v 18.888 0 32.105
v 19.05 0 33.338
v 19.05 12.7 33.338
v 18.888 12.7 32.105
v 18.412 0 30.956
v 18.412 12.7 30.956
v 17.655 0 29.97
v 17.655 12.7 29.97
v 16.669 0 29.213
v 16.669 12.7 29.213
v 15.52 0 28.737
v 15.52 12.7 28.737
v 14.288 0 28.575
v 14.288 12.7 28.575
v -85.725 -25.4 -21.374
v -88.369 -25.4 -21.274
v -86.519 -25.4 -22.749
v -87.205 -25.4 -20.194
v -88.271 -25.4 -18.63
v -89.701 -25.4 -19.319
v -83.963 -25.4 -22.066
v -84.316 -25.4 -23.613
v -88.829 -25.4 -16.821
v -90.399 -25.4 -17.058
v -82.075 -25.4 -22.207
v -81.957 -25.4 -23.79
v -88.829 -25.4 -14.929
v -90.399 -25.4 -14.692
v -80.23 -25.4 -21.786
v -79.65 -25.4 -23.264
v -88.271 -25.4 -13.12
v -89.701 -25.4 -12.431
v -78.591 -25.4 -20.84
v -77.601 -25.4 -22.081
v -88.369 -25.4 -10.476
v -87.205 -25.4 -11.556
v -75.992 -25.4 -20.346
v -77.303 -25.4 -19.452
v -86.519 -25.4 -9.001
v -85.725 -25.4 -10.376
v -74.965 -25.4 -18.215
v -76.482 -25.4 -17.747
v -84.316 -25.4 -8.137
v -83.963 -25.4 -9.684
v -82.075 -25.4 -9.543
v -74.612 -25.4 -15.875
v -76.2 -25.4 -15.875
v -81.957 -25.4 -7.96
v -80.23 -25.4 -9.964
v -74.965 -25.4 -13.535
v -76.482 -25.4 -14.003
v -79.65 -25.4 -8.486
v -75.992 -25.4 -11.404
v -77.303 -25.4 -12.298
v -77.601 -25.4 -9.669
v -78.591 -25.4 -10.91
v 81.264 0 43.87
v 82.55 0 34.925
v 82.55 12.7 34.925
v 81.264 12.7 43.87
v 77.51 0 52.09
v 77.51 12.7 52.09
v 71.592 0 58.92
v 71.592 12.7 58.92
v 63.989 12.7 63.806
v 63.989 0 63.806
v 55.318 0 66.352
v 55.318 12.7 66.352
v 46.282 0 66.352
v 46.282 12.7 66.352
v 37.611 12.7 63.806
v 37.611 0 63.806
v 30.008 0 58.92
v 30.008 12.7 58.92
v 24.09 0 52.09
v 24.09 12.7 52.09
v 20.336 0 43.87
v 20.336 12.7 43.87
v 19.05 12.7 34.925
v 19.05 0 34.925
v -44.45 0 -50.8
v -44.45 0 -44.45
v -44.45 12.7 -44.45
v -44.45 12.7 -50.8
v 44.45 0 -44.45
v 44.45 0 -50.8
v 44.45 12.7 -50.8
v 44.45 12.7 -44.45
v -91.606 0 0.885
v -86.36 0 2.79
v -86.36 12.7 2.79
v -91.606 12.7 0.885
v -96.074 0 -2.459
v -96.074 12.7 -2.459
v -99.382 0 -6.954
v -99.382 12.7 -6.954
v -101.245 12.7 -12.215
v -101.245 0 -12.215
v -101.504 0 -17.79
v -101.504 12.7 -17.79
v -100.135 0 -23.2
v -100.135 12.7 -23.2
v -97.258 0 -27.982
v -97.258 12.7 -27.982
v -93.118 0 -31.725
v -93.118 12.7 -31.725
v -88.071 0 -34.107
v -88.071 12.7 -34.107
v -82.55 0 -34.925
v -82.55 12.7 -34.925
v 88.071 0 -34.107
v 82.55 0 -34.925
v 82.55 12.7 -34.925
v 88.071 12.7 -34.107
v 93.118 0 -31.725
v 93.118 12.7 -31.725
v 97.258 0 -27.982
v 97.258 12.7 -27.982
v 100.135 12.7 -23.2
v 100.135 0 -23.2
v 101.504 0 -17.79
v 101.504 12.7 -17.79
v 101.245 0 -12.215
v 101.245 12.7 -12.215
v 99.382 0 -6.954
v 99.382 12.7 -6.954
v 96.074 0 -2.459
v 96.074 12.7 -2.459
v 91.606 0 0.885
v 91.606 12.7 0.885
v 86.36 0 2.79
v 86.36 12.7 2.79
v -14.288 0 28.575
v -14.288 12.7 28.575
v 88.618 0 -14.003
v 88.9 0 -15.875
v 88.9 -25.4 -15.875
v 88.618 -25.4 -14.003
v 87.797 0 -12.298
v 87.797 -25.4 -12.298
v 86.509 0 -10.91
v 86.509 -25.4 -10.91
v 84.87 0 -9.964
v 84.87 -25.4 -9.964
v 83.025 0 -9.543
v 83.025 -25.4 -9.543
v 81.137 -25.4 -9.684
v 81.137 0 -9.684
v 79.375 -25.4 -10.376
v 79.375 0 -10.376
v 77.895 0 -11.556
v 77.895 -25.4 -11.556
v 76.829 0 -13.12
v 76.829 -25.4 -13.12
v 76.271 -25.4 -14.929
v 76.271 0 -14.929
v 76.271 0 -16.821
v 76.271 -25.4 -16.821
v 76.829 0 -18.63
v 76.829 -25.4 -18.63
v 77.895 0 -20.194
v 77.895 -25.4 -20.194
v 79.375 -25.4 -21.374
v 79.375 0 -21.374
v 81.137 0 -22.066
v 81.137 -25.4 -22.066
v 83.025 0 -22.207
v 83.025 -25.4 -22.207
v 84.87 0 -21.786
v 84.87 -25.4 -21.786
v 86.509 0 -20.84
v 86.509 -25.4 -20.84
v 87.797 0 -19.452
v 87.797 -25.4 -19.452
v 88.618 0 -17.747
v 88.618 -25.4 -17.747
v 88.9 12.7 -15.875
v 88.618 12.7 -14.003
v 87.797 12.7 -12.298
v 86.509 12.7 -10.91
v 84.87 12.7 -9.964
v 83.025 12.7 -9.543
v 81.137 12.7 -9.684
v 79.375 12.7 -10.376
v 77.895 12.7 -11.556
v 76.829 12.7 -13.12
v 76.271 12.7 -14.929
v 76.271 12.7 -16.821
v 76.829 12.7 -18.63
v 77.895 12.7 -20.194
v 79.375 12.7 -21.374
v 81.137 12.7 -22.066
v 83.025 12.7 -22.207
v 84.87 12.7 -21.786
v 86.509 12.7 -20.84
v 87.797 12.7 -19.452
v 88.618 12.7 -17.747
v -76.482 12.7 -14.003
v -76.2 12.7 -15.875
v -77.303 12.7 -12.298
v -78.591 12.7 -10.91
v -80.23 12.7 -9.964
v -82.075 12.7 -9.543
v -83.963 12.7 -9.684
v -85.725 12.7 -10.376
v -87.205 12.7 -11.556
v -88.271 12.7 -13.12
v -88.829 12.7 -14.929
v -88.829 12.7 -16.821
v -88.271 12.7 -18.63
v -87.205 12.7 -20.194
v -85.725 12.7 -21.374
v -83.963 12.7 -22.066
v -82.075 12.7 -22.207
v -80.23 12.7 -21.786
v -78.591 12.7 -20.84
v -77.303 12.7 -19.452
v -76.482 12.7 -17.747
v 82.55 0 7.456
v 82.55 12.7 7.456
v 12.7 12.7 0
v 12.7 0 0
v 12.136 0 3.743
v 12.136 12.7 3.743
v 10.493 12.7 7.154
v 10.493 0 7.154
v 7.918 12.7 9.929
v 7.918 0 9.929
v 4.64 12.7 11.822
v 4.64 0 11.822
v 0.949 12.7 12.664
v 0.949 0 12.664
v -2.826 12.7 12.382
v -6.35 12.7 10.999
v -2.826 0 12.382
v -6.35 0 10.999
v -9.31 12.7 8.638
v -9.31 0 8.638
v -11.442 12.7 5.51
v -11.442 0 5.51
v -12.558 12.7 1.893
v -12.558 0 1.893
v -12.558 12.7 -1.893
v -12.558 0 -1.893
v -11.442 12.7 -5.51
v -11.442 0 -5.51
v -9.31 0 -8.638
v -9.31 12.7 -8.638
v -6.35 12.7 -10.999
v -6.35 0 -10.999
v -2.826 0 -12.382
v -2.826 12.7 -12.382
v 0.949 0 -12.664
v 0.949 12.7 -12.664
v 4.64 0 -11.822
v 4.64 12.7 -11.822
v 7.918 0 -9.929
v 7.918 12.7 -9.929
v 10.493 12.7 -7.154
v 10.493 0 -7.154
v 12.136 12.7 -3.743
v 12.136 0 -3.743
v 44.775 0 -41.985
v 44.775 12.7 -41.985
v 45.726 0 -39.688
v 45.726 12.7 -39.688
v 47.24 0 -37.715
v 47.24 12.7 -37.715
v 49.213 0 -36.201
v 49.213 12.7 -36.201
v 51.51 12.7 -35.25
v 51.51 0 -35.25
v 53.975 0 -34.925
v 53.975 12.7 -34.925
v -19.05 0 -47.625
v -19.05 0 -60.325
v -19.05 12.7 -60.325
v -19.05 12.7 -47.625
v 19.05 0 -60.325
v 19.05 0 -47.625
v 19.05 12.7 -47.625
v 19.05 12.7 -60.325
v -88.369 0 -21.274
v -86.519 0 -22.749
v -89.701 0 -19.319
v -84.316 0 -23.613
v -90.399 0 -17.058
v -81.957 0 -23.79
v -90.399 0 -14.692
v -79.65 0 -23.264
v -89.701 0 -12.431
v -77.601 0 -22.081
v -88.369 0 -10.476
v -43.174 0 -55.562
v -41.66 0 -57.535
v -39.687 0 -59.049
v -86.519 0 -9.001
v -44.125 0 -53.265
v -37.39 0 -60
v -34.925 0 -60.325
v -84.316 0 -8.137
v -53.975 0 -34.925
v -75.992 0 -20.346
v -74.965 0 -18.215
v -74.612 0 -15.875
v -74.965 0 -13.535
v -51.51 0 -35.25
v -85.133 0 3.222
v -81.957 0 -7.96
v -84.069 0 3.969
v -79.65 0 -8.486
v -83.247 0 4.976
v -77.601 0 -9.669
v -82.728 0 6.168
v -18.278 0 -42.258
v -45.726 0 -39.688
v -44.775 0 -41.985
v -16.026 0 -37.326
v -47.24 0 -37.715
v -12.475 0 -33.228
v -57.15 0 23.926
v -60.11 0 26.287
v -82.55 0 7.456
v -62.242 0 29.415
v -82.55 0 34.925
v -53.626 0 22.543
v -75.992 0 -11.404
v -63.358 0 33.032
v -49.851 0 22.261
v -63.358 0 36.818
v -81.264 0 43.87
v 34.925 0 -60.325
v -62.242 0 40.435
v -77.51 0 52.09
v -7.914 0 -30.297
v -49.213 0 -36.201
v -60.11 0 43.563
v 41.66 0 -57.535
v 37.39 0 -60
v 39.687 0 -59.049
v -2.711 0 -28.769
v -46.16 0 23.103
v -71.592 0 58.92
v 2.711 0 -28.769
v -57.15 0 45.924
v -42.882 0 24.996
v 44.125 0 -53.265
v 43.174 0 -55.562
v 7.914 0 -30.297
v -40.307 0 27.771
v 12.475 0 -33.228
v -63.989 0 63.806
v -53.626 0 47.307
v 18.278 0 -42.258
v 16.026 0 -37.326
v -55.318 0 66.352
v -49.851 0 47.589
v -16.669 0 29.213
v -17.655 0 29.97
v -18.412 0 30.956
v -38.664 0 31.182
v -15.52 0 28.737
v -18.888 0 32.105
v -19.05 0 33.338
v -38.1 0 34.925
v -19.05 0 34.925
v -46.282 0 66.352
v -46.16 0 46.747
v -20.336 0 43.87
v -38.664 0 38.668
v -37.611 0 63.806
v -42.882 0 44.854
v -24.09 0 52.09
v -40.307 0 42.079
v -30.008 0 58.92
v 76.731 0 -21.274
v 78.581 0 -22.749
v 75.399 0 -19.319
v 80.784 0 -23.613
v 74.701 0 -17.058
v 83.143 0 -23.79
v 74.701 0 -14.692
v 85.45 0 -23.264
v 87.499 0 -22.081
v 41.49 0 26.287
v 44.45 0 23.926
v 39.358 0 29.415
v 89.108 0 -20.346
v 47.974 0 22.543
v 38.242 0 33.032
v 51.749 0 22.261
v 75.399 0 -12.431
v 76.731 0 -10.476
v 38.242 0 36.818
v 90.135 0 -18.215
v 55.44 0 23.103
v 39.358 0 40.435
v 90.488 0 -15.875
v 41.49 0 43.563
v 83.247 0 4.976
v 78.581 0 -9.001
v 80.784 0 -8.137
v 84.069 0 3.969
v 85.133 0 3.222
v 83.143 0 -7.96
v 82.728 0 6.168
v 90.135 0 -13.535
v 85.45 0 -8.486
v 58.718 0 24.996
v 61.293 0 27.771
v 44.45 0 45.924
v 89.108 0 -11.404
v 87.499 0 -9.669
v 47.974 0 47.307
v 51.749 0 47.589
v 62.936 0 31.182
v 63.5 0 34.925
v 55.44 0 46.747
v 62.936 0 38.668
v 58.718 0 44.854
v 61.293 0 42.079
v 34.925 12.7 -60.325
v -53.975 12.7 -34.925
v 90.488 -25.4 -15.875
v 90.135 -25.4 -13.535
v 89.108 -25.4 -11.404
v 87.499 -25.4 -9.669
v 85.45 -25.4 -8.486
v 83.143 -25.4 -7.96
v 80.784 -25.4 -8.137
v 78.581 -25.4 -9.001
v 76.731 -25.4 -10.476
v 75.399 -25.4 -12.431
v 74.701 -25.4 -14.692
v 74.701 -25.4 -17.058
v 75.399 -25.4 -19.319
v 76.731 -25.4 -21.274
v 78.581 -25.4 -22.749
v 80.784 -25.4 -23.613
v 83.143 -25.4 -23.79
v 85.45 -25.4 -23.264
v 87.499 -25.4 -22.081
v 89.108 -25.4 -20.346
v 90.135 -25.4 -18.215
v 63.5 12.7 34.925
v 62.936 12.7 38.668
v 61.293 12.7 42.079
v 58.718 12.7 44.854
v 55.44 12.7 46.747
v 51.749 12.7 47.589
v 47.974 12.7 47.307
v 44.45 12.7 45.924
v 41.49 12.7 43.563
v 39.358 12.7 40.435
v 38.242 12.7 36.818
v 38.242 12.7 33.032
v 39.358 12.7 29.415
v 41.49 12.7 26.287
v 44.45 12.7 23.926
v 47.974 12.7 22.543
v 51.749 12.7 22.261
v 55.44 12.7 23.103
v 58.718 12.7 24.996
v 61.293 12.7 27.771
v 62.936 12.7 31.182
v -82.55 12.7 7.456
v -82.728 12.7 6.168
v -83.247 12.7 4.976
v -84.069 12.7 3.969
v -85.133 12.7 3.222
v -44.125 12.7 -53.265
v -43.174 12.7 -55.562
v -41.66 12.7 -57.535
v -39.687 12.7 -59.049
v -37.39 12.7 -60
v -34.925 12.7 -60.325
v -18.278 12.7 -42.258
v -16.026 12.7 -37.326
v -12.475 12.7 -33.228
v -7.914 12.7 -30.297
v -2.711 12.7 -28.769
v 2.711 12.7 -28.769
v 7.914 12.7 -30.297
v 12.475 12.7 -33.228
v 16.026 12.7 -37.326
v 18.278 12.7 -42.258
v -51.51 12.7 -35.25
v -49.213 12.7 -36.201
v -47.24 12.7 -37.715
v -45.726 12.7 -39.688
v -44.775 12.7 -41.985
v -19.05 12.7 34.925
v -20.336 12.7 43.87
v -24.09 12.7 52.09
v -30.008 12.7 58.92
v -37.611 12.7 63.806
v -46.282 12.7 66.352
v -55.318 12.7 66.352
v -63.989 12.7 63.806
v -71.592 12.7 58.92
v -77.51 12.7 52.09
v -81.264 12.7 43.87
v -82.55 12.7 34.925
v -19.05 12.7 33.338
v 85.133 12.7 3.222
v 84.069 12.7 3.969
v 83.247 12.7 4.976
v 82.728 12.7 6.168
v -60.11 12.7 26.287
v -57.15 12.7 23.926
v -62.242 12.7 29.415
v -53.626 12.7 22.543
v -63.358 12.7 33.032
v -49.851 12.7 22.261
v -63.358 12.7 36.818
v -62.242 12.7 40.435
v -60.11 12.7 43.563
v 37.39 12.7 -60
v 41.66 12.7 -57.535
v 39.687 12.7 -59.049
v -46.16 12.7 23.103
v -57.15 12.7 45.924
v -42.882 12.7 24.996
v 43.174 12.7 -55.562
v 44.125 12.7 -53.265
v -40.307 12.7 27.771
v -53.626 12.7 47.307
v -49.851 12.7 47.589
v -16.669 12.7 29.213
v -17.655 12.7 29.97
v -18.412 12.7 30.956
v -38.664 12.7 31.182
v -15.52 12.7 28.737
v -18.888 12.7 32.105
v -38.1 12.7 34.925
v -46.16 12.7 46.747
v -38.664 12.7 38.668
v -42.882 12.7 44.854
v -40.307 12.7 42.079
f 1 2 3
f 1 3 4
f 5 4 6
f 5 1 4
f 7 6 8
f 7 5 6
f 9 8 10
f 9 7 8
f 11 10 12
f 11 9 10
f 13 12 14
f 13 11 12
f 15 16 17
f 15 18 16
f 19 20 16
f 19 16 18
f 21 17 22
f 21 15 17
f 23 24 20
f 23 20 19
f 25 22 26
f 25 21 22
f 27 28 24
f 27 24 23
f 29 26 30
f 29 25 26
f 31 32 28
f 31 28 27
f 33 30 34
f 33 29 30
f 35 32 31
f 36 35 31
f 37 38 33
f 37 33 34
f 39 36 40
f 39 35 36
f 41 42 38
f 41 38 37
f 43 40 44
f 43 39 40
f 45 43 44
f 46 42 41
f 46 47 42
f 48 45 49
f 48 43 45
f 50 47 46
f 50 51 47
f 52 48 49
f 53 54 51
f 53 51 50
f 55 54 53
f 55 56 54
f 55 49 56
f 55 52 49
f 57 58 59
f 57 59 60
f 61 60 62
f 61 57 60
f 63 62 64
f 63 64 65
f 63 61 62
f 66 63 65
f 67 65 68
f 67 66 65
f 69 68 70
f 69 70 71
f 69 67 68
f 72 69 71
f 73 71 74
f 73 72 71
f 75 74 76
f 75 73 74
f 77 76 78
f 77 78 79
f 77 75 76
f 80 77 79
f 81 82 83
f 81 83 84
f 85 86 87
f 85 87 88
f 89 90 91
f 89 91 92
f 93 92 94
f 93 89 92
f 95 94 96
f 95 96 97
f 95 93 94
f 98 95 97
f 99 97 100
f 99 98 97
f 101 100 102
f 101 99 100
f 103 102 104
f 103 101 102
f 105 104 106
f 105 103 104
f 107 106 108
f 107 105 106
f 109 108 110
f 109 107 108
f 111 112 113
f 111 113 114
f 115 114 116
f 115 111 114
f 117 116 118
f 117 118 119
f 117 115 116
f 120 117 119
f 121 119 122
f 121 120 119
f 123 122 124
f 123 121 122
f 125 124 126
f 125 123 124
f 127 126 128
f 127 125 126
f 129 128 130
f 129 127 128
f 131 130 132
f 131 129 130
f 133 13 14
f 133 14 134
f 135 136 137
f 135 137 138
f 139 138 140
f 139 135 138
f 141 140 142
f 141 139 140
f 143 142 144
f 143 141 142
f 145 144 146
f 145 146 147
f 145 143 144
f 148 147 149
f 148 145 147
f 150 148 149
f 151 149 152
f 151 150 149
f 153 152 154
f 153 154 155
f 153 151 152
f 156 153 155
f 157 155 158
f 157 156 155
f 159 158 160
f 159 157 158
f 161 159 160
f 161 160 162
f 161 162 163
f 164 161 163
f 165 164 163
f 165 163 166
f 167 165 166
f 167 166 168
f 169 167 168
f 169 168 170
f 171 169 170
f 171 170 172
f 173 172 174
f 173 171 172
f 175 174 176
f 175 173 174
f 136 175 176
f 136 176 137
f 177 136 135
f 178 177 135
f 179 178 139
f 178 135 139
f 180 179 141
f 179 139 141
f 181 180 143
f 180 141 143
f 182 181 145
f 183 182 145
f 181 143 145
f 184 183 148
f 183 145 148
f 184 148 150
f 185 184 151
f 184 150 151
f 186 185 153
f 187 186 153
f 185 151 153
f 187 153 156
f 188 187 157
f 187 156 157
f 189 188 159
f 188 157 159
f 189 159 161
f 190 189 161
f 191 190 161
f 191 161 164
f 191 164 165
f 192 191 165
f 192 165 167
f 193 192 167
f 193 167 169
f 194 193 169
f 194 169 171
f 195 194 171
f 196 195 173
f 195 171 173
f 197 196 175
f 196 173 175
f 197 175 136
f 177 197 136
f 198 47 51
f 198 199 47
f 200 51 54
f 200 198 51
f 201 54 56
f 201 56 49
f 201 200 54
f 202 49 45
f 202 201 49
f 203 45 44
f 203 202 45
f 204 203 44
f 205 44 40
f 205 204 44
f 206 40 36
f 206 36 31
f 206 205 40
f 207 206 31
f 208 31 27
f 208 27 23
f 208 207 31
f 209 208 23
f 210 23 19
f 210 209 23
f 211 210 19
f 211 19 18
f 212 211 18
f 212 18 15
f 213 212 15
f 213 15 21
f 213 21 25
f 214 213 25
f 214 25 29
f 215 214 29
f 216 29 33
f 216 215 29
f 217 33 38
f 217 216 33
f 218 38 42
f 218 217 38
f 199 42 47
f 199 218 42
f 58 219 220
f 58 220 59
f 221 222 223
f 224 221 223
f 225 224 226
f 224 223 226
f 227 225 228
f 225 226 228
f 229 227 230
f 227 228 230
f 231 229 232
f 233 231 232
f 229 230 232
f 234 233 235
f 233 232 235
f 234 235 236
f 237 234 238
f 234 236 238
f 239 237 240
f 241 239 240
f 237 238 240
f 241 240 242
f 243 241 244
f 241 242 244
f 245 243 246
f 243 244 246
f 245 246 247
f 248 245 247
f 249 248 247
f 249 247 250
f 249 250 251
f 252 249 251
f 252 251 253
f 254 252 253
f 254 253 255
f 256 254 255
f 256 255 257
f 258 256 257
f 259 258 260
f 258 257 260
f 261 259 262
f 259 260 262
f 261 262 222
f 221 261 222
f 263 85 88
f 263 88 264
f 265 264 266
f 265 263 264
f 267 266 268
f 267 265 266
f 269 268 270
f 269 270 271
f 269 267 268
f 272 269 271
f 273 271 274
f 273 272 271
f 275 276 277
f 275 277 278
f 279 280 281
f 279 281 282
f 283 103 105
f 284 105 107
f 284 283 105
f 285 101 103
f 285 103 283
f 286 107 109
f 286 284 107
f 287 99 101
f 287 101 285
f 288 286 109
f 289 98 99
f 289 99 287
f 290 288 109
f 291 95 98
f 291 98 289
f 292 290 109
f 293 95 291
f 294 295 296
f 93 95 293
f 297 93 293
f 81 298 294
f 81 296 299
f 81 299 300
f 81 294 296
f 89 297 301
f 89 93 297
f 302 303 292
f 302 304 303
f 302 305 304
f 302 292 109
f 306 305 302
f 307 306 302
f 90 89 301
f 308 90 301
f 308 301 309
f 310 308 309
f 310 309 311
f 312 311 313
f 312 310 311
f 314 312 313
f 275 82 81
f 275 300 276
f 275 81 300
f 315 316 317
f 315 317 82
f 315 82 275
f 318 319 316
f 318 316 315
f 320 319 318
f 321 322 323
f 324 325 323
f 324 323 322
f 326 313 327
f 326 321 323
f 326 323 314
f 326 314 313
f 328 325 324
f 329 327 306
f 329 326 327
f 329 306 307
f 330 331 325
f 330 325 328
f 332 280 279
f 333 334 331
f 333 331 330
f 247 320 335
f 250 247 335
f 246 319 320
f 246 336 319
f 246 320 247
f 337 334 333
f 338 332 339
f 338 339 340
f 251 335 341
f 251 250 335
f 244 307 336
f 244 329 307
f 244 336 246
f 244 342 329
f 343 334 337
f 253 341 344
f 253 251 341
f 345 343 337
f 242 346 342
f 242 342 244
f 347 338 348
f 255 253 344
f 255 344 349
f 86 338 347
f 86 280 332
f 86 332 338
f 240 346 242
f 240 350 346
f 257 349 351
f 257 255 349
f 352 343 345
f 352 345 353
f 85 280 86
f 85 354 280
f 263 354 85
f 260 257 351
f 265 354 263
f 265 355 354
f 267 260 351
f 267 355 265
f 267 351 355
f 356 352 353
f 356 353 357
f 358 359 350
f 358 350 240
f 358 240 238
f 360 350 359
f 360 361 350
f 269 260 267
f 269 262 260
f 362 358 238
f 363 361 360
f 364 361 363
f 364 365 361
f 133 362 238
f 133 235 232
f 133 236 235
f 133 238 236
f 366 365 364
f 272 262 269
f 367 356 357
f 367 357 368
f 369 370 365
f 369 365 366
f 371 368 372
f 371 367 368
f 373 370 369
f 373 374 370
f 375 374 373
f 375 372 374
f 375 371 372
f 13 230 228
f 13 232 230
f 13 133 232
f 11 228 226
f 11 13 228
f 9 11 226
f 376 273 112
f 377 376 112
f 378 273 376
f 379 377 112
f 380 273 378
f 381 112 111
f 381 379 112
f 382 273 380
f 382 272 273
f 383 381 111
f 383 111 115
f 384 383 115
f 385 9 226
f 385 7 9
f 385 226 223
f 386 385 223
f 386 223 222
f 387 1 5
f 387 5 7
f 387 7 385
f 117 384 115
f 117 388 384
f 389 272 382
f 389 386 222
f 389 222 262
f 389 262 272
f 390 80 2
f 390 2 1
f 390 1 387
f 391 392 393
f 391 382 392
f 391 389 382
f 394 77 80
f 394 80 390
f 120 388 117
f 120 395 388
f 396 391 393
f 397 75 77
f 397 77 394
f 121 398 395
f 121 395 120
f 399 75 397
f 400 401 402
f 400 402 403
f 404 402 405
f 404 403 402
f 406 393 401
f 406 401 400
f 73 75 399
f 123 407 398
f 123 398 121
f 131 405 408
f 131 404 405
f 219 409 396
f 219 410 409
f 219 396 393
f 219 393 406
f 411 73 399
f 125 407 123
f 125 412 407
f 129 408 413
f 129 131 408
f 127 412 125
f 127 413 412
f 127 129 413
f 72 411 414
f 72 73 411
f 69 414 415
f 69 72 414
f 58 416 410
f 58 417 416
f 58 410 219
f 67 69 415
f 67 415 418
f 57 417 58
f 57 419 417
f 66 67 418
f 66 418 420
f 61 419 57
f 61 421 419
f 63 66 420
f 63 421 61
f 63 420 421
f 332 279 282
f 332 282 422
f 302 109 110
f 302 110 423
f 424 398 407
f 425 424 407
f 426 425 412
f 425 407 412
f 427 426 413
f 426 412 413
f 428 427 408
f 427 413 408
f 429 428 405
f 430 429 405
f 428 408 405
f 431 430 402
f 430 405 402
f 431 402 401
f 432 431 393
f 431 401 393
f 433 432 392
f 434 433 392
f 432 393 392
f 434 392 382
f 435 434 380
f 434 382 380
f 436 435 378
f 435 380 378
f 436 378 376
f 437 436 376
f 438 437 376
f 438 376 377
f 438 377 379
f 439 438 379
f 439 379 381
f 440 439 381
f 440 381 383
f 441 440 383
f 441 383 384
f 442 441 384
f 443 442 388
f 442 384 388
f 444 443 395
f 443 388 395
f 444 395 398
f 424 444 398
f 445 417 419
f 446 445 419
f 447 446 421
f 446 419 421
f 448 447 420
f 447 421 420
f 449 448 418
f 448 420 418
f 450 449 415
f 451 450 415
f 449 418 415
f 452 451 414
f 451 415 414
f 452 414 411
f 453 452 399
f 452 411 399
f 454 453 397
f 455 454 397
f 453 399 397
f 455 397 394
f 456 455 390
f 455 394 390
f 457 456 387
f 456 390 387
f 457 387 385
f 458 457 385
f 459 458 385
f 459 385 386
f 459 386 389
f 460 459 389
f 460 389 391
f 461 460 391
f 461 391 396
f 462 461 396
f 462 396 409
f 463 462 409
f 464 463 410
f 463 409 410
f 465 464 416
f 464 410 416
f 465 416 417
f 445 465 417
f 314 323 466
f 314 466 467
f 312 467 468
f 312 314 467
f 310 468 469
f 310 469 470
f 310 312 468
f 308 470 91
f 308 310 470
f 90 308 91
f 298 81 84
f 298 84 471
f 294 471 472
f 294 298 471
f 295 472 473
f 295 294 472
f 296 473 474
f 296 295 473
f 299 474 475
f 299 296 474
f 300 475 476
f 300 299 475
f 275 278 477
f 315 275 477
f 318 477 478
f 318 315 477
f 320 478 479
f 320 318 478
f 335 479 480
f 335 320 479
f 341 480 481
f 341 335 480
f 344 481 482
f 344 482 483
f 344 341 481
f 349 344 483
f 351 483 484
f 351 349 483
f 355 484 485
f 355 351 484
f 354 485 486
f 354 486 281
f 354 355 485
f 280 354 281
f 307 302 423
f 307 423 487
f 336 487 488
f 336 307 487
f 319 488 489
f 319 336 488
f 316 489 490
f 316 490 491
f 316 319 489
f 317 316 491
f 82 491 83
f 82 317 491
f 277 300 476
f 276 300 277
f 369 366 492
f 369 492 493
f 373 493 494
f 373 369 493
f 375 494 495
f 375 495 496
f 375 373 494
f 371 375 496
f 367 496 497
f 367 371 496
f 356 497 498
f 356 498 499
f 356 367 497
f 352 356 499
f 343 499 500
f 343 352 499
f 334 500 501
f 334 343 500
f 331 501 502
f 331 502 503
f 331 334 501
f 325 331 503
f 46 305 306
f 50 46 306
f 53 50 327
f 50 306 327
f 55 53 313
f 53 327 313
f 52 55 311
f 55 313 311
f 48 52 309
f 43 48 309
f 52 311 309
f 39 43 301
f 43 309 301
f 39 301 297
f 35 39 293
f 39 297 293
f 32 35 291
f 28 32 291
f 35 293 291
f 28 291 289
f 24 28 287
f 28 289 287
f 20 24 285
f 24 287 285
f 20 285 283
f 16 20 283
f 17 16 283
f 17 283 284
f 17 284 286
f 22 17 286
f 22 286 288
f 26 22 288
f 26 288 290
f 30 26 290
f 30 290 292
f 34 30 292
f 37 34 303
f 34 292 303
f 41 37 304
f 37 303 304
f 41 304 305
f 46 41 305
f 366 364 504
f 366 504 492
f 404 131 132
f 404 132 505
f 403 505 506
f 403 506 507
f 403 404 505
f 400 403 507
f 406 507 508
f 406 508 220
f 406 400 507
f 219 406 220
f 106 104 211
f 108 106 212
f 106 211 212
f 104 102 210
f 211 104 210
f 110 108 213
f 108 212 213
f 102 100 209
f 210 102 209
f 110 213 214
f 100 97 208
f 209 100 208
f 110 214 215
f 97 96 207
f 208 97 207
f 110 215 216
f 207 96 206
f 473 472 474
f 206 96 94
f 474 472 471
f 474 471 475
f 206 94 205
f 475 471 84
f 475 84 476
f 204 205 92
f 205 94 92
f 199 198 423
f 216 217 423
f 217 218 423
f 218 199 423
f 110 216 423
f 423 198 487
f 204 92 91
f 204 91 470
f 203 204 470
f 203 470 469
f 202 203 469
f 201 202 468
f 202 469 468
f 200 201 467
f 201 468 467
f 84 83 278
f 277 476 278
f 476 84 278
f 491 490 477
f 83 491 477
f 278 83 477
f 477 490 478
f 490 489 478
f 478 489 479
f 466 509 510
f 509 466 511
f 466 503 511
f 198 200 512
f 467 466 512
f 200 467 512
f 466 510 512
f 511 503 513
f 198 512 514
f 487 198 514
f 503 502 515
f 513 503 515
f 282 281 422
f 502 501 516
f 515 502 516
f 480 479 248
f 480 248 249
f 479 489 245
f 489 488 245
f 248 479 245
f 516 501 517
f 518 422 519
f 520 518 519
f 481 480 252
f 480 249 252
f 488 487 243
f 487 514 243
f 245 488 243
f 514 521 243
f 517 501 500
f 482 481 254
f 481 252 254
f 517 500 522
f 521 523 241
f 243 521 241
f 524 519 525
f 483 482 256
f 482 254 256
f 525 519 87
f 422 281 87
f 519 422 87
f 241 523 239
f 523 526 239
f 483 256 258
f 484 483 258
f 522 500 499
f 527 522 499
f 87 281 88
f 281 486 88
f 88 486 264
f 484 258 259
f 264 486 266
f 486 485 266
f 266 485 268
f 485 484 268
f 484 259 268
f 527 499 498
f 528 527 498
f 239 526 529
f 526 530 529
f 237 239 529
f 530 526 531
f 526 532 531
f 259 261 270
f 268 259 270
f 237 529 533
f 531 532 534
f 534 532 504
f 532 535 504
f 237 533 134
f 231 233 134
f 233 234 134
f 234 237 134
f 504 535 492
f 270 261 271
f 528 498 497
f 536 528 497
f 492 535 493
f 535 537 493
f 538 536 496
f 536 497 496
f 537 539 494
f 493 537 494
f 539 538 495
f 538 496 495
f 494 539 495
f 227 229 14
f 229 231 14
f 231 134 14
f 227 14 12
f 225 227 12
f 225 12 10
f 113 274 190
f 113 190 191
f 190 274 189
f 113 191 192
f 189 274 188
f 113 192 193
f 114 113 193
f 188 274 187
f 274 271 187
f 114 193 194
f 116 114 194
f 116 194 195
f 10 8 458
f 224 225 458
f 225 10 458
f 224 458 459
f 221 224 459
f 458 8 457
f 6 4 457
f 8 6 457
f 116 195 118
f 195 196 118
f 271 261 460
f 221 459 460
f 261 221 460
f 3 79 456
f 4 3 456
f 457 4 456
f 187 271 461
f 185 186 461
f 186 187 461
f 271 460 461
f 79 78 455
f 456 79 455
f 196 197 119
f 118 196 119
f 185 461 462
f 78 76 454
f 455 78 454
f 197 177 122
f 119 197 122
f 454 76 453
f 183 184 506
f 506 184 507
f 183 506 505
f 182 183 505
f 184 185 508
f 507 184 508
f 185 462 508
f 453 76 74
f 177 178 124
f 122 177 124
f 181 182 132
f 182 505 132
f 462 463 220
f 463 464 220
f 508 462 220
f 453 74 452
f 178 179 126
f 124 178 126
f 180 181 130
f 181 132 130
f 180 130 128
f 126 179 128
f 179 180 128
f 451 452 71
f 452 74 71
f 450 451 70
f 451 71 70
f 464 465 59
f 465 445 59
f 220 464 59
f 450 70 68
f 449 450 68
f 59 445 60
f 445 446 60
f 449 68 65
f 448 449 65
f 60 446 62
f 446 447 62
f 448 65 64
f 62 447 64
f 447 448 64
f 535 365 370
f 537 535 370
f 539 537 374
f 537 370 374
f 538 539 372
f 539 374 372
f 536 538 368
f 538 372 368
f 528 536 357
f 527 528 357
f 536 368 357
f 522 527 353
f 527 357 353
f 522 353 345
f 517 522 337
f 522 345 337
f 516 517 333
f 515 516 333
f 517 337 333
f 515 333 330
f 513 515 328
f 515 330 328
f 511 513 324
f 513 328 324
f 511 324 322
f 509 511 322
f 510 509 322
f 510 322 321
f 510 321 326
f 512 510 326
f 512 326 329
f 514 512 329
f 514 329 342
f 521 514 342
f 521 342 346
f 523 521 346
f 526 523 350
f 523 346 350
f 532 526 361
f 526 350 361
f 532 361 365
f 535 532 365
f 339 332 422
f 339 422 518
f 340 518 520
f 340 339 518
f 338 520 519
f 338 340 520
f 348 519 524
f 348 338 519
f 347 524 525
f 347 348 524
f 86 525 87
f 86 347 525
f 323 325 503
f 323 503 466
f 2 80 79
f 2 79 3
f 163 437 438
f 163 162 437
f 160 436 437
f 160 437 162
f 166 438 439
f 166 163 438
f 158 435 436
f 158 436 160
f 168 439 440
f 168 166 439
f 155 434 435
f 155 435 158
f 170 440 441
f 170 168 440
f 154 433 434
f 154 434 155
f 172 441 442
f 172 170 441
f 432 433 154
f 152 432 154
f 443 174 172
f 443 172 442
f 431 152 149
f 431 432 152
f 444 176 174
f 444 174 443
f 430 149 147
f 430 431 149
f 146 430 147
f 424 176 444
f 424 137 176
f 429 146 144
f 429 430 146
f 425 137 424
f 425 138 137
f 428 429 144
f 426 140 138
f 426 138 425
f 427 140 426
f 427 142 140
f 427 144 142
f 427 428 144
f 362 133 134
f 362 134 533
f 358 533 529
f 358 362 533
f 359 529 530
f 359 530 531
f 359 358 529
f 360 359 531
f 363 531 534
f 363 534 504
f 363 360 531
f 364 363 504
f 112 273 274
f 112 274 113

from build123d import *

# Parameters (mm, degrees)
F0_R     = 7.9375
F0_R_2   = 12.7
F0_R_3   = 6.35
F1_DEPTH = 12.7
F2_DEPTH = 25.4


with BuildPart() as f1:
    # F0 (on Front) → F1 (new body)
    with BuildSketch(Plane.XZ):
        with BuildLine():
            Line((14.2875, 28.575), (0, 28.575))
            Line((0, 28.575), (-14.2875, 28.575))
            ThreePointArc((-14.2875, 28.575), (-17.655096, 29.969904), (-19.05, 33.3375))
            Line((-19.05, 33.3375), (-19.05, 34.925))
            ThreePointArc((-19.05, 34.925), (-50.8, 66.675), (-82.55, 34.925))
            Line((-82.55, 34.925), (-82.55, 7.45639))
            ThreePointArc((-82.55, 7.45639), (-83.623483, 4.44432), (-86.36, 2.790112))
            ThreePointArc((-86.36, 2.790112), (-101.503534, -17.789696), (-82.55, -34.925))
            Line((-82.55, -34.925), (-53.975, -34.925))
            ThreePointArc((-53.975, -34.925), (-47.239808, -37.714808), (-44.45, -44.45))
            Line((-44.45, -44.45), (-44.45, -50.8))
            ThreePointArc((-44.45, -50.8), (-41.660192, -57.535192), (-34.925, -60.325))
            Line((-34.925, -60.325), (-19.05, -60.325))
            Line((-19.05, -60.325), (-19.05, -47.625))
            ThreePointArc((-19.05, -47.625), (0, -28.575), (19.05, -47.625))
            Line((19.05, -47.625), (19.05, -60.325))
            Line((19.05, -60.325), (34.925, -60.325))
            ThreePointArc((34.925, -60.325), (41.660192, -57.535192), (44.45, -50.8))
            Line((44.45, -50.8), (44.45, -44.45))
            ThreePointArc((44.45, -44.45), (47.239808, -37.714808), (53.975, -34.925))
            Line((53.975, -34.925), (82.55, -34.925))
            ThreePointArc((82.55, -34.925), (101.503534, -17.789696), (86.36, 2.790112))
            ThreePointArc((86.36, 2.790112), (83.623483, 4.44432), (82.55, 7.45639))
            Line((82.55, 7.45639), (82.55, 34.925))
            ThreePointArc((82.55, 34.925), (50.8, 66.675), (19.05, 34.925))
            Line((19.05, 34.925), (19.05, 33.3375))
            ThreePointArc((19.05, 33.3375), (17.655096, 29.969904), (14.2875, 28.575))
        make_face()
        with Locations((-82.55, -15.875)):
            Circle(F0_R, mode=Mode.SUBTRACT)
        Circle(F0_R_2, mode=Mode.SUBTRACT)
        with Locations((82.55, -15.875)):
            Circle(F0_R, mode=Mode.SUBTRACT)
        with Locations((-50.8, 34.925)):
            Circle(F0_R_2, mode=Mode.SUBTRACT)
        with Locations((50.8, 34.925)):
            Circle(F0_R_2, mode=Mode.SUBTRACT)
        with Locations((82.55, -15.875)):
            Circle(F0_R)
        with Locations((82.55, -15.875)):
            Circle(F0_R_3, mode=Mode.SUBTRACT)
        with Locations((-82.55, -15.875)):
            Circle(F0_R)
        with Locations((-82.55, -15.875)):
            Circle(F0_R_3, mode=Mode.SUBTRACT)
    extrude(amount=-F1_DEPTH)

    # F0 (on Front) → F2 (join)
    with BuildSketch(Plane.XZ):
        with Locations((-82.55, -15.875)):
            Circle(F0_R)
        with Locations((-82.55, -15.875)):
            Circle(F0_R_3, mode=Mode.SUBTRACT)
        with Locations((82.55, -15.875)):
            Circle(F0_R)
        with Locations((82.55, -15.875)):
            Circle(F0_R_3, mode=Mode.SUBTRACT)
    extrude(amount=F2_DEPTH)


solid = f1.part
